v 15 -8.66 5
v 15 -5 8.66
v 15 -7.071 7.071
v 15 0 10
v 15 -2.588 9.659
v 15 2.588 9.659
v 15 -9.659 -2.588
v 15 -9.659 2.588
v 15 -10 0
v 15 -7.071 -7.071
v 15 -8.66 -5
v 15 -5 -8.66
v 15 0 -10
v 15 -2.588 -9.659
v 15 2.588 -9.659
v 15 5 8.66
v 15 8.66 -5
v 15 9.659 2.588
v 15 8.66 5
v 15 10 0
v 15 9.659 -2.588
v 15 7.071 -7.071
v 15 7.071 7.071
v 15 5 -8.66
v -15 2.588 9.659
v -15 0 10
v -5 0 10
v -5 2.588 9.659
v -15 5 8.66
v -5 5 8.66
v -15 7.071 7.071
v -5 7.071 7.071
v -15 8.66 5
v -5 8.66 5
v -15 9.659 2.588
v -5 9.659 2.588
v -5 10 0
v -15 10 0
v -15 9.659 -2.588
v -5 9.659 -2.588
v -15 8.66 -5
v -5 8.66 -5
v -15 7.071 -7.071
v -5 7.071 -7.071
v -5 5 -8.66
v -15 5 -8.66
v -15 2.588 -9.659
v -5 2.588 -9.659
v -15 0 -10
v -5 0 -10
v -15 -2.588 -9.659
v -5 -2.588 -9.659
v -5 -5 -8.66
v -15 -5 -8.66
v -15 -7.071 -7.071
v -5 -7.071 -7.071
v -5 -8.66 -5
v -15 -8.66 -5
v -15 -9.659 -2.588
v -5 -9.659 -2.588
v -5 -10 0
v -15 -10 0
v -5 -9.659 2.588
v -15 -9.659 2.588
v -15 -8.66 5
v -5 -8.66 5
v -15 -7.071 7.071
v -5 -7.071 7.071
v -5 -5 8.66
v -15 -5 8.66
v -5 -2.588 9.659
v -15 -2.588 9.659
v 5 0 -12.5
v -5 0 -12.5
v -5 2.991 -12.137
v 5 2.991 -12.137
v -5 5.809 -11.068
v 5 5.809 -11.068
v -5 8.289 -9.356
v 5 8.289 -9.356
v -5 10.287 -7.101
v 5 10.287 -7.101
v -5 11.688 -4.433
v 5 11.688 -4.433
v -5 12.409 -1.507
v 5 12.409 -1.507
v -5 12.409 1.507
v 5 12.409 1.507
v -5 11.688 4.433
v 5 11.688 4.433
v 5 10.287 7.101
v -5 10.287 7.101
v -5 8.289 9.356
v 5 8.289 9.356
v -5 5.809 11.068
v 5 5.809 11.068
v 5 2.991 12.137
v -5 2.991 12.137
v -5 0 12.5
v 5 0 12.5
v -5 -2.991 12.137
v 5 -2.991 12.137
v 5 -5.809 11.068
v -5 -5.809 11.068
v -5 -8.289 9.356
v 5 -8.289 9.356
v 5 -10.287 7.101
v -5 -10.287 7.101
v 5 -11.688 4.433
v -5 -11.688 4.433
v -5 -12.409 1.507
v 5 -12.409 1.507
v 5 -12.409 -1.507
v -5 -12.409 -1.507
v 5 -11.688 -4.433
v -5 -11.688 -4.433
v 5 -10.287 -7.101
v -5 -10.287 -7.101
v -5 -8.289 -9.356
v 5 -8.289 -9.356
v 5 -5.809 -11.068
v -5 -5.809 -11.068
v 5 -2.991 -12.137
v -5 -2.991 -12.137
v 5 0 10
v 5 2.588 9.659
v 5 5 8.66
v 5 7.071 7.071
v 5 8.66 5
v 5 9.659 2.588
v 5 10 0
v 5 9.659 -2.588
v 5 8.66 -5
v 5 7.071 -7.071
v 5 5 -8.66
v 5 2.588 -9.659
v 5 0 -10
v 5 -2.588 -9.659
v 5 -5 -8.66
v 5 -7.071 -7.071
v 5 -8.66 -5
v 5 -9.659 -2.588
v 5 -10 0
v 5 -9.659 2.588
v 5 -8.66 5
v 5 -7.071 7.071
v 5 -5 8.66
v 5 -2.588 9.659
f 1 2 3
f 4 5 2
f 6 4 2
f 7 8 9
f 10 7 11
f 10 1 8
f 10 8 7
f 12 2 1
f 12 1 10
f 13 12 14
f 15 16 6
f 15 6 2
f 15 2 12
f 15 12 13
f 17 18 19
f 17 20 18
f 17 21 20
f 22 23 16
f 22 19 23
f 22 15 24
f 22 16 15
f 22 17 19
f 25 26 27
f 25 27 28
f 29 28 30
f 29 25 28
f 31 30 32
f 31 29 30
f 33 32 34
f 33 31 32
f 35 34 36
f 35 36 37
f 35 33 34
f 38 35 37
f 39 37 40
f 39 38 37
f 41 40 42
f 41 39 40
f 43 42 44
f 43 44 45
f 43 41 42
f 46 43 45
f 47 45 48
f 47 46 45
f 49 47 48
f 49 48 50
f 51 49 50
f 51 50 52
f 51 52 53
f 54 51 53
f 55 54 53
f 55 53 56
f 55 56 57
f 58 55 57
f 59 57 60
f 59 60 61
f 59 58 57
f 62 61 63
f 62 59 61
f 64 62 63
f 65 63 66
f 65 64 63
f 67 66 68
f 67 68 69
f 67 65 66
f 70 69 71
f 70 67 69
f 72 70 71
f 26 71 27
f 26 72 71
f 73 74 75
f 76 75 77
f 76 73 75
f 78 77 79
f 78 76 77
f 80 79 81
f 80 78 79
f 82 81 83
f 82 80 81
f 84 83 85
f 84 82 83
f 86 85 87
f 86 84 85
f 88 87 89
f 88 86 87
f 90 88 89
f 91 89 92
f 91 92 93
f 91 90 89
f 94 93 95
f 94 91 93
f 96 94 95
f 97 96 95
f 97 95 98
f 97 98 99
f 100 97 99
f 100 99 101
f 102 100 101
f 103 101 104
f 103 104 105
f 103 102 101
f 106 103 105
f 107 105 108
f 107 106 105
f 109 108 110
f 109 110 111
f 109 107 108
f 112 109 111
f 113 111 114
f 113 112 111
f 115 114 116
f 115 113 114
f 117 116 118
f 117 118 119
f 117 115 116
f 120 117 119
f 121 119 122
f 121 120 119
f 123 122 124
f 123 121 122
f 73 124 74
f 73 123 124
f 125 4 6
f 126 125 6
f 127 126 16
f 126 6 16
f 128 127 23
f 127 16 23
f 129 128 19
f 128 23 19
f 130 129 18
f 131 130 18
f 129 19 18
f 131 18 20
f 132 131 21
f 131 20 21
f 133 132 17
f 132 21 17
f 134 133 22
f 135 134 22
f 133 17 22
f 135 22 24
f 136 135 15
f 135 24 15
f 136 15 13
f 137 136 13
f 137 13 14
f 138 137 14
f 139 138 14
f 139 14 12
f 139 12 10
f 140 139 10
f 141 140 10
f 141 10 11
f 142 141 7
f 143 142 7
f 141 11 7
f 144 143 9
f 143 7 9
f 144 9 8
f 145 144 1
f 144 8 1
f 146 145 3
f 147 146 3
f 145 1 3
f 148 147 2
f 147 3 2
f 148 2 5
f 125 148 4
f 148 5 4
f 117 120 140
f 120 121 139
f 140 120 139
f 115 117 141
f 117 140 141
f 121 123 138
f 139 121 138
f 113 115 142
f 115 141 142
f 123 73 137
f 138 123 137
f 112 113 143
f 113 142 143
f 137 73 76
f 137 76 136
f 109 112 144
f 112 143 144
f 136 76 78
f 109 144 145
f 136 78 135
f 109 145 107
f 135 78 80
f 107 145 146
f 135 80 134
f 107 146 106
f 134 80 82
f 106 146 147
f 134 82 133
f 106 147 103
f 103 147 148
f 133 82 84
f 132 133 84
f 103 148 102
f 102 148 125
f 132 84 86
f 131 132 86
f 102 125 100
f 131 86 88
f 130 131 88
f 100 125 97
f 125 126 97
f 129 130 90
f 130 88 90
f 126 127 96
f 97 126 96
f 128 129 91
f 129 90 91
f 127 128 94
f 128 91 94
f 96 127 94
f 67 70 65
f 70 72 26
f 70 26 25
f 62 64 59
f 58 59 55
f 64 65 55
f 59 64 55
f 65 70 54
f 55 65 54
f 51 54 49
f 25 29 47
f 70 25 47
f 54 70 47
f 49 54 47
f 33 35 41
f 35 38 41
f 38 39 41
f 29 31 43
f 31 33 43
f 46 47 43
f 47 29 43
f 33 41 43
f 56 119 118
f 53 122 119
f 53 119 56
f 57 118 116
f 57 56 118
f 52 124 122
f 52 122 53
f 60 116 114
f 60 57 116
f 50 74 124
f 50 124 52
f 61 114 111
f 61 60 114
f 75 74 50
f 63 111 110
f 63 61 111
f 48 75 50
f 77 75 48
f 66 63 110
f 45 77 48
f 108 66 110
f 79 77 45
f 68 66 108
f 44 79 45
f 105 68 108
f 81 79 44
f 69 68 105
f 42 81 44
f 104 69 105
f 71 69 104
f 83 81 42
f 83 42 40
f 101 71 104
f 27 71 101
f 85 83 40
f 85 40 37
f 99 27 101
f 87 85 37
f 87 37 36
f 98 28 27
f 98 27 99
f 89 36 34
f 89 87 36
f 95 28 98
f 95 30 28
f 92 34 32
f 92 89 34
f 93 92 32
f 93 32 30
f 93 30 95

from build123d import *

# Parameters (mm, degrees)
SKETCH1_R           = 12.5
BOSS_EXTRUDE1_DEPTH = 15
SKETCH2_R           = 12.5
SKETCH2_R_2         = 10
CUT_EXTRUDE1_DEPTH  = 10


with BuildPart() as part:
    # Sketch1 → Boss-Extrude1 (new body, symmetric)
    with BuildSketch(Plane(origin=(0, 0, 0), x_dir=(0, 0, -1), z_dir=(1, 0, 0))):
        Circle(SKETCH1_R)
    extrude(amount=BOSS_EXTRUDE1_DEPTH, both=True)

    # Sketch2 → Cut-Extrude1 (cut)
    with BuildSketch(Plane.ZY.offset(15)):
        Circle(SKETCH2_R)
        Circle(SKETCH2_R_2, mode=Mode.SUBTRACT)
    cut_extrude1 = extrude(amount=-CUT_EXTRUDE1_DEPTH, mode=Mode.SUBTRACT)

    # Mirror1: Cut-Extrude1 across plane
    add(cut_extrude1.mirror(Plane(origin=(0, 0, 0), x_dir=(0, 0, 1), z_dir=(1, 0, 0))), mode=Mode.SUBTRACT)


solid = part.part
